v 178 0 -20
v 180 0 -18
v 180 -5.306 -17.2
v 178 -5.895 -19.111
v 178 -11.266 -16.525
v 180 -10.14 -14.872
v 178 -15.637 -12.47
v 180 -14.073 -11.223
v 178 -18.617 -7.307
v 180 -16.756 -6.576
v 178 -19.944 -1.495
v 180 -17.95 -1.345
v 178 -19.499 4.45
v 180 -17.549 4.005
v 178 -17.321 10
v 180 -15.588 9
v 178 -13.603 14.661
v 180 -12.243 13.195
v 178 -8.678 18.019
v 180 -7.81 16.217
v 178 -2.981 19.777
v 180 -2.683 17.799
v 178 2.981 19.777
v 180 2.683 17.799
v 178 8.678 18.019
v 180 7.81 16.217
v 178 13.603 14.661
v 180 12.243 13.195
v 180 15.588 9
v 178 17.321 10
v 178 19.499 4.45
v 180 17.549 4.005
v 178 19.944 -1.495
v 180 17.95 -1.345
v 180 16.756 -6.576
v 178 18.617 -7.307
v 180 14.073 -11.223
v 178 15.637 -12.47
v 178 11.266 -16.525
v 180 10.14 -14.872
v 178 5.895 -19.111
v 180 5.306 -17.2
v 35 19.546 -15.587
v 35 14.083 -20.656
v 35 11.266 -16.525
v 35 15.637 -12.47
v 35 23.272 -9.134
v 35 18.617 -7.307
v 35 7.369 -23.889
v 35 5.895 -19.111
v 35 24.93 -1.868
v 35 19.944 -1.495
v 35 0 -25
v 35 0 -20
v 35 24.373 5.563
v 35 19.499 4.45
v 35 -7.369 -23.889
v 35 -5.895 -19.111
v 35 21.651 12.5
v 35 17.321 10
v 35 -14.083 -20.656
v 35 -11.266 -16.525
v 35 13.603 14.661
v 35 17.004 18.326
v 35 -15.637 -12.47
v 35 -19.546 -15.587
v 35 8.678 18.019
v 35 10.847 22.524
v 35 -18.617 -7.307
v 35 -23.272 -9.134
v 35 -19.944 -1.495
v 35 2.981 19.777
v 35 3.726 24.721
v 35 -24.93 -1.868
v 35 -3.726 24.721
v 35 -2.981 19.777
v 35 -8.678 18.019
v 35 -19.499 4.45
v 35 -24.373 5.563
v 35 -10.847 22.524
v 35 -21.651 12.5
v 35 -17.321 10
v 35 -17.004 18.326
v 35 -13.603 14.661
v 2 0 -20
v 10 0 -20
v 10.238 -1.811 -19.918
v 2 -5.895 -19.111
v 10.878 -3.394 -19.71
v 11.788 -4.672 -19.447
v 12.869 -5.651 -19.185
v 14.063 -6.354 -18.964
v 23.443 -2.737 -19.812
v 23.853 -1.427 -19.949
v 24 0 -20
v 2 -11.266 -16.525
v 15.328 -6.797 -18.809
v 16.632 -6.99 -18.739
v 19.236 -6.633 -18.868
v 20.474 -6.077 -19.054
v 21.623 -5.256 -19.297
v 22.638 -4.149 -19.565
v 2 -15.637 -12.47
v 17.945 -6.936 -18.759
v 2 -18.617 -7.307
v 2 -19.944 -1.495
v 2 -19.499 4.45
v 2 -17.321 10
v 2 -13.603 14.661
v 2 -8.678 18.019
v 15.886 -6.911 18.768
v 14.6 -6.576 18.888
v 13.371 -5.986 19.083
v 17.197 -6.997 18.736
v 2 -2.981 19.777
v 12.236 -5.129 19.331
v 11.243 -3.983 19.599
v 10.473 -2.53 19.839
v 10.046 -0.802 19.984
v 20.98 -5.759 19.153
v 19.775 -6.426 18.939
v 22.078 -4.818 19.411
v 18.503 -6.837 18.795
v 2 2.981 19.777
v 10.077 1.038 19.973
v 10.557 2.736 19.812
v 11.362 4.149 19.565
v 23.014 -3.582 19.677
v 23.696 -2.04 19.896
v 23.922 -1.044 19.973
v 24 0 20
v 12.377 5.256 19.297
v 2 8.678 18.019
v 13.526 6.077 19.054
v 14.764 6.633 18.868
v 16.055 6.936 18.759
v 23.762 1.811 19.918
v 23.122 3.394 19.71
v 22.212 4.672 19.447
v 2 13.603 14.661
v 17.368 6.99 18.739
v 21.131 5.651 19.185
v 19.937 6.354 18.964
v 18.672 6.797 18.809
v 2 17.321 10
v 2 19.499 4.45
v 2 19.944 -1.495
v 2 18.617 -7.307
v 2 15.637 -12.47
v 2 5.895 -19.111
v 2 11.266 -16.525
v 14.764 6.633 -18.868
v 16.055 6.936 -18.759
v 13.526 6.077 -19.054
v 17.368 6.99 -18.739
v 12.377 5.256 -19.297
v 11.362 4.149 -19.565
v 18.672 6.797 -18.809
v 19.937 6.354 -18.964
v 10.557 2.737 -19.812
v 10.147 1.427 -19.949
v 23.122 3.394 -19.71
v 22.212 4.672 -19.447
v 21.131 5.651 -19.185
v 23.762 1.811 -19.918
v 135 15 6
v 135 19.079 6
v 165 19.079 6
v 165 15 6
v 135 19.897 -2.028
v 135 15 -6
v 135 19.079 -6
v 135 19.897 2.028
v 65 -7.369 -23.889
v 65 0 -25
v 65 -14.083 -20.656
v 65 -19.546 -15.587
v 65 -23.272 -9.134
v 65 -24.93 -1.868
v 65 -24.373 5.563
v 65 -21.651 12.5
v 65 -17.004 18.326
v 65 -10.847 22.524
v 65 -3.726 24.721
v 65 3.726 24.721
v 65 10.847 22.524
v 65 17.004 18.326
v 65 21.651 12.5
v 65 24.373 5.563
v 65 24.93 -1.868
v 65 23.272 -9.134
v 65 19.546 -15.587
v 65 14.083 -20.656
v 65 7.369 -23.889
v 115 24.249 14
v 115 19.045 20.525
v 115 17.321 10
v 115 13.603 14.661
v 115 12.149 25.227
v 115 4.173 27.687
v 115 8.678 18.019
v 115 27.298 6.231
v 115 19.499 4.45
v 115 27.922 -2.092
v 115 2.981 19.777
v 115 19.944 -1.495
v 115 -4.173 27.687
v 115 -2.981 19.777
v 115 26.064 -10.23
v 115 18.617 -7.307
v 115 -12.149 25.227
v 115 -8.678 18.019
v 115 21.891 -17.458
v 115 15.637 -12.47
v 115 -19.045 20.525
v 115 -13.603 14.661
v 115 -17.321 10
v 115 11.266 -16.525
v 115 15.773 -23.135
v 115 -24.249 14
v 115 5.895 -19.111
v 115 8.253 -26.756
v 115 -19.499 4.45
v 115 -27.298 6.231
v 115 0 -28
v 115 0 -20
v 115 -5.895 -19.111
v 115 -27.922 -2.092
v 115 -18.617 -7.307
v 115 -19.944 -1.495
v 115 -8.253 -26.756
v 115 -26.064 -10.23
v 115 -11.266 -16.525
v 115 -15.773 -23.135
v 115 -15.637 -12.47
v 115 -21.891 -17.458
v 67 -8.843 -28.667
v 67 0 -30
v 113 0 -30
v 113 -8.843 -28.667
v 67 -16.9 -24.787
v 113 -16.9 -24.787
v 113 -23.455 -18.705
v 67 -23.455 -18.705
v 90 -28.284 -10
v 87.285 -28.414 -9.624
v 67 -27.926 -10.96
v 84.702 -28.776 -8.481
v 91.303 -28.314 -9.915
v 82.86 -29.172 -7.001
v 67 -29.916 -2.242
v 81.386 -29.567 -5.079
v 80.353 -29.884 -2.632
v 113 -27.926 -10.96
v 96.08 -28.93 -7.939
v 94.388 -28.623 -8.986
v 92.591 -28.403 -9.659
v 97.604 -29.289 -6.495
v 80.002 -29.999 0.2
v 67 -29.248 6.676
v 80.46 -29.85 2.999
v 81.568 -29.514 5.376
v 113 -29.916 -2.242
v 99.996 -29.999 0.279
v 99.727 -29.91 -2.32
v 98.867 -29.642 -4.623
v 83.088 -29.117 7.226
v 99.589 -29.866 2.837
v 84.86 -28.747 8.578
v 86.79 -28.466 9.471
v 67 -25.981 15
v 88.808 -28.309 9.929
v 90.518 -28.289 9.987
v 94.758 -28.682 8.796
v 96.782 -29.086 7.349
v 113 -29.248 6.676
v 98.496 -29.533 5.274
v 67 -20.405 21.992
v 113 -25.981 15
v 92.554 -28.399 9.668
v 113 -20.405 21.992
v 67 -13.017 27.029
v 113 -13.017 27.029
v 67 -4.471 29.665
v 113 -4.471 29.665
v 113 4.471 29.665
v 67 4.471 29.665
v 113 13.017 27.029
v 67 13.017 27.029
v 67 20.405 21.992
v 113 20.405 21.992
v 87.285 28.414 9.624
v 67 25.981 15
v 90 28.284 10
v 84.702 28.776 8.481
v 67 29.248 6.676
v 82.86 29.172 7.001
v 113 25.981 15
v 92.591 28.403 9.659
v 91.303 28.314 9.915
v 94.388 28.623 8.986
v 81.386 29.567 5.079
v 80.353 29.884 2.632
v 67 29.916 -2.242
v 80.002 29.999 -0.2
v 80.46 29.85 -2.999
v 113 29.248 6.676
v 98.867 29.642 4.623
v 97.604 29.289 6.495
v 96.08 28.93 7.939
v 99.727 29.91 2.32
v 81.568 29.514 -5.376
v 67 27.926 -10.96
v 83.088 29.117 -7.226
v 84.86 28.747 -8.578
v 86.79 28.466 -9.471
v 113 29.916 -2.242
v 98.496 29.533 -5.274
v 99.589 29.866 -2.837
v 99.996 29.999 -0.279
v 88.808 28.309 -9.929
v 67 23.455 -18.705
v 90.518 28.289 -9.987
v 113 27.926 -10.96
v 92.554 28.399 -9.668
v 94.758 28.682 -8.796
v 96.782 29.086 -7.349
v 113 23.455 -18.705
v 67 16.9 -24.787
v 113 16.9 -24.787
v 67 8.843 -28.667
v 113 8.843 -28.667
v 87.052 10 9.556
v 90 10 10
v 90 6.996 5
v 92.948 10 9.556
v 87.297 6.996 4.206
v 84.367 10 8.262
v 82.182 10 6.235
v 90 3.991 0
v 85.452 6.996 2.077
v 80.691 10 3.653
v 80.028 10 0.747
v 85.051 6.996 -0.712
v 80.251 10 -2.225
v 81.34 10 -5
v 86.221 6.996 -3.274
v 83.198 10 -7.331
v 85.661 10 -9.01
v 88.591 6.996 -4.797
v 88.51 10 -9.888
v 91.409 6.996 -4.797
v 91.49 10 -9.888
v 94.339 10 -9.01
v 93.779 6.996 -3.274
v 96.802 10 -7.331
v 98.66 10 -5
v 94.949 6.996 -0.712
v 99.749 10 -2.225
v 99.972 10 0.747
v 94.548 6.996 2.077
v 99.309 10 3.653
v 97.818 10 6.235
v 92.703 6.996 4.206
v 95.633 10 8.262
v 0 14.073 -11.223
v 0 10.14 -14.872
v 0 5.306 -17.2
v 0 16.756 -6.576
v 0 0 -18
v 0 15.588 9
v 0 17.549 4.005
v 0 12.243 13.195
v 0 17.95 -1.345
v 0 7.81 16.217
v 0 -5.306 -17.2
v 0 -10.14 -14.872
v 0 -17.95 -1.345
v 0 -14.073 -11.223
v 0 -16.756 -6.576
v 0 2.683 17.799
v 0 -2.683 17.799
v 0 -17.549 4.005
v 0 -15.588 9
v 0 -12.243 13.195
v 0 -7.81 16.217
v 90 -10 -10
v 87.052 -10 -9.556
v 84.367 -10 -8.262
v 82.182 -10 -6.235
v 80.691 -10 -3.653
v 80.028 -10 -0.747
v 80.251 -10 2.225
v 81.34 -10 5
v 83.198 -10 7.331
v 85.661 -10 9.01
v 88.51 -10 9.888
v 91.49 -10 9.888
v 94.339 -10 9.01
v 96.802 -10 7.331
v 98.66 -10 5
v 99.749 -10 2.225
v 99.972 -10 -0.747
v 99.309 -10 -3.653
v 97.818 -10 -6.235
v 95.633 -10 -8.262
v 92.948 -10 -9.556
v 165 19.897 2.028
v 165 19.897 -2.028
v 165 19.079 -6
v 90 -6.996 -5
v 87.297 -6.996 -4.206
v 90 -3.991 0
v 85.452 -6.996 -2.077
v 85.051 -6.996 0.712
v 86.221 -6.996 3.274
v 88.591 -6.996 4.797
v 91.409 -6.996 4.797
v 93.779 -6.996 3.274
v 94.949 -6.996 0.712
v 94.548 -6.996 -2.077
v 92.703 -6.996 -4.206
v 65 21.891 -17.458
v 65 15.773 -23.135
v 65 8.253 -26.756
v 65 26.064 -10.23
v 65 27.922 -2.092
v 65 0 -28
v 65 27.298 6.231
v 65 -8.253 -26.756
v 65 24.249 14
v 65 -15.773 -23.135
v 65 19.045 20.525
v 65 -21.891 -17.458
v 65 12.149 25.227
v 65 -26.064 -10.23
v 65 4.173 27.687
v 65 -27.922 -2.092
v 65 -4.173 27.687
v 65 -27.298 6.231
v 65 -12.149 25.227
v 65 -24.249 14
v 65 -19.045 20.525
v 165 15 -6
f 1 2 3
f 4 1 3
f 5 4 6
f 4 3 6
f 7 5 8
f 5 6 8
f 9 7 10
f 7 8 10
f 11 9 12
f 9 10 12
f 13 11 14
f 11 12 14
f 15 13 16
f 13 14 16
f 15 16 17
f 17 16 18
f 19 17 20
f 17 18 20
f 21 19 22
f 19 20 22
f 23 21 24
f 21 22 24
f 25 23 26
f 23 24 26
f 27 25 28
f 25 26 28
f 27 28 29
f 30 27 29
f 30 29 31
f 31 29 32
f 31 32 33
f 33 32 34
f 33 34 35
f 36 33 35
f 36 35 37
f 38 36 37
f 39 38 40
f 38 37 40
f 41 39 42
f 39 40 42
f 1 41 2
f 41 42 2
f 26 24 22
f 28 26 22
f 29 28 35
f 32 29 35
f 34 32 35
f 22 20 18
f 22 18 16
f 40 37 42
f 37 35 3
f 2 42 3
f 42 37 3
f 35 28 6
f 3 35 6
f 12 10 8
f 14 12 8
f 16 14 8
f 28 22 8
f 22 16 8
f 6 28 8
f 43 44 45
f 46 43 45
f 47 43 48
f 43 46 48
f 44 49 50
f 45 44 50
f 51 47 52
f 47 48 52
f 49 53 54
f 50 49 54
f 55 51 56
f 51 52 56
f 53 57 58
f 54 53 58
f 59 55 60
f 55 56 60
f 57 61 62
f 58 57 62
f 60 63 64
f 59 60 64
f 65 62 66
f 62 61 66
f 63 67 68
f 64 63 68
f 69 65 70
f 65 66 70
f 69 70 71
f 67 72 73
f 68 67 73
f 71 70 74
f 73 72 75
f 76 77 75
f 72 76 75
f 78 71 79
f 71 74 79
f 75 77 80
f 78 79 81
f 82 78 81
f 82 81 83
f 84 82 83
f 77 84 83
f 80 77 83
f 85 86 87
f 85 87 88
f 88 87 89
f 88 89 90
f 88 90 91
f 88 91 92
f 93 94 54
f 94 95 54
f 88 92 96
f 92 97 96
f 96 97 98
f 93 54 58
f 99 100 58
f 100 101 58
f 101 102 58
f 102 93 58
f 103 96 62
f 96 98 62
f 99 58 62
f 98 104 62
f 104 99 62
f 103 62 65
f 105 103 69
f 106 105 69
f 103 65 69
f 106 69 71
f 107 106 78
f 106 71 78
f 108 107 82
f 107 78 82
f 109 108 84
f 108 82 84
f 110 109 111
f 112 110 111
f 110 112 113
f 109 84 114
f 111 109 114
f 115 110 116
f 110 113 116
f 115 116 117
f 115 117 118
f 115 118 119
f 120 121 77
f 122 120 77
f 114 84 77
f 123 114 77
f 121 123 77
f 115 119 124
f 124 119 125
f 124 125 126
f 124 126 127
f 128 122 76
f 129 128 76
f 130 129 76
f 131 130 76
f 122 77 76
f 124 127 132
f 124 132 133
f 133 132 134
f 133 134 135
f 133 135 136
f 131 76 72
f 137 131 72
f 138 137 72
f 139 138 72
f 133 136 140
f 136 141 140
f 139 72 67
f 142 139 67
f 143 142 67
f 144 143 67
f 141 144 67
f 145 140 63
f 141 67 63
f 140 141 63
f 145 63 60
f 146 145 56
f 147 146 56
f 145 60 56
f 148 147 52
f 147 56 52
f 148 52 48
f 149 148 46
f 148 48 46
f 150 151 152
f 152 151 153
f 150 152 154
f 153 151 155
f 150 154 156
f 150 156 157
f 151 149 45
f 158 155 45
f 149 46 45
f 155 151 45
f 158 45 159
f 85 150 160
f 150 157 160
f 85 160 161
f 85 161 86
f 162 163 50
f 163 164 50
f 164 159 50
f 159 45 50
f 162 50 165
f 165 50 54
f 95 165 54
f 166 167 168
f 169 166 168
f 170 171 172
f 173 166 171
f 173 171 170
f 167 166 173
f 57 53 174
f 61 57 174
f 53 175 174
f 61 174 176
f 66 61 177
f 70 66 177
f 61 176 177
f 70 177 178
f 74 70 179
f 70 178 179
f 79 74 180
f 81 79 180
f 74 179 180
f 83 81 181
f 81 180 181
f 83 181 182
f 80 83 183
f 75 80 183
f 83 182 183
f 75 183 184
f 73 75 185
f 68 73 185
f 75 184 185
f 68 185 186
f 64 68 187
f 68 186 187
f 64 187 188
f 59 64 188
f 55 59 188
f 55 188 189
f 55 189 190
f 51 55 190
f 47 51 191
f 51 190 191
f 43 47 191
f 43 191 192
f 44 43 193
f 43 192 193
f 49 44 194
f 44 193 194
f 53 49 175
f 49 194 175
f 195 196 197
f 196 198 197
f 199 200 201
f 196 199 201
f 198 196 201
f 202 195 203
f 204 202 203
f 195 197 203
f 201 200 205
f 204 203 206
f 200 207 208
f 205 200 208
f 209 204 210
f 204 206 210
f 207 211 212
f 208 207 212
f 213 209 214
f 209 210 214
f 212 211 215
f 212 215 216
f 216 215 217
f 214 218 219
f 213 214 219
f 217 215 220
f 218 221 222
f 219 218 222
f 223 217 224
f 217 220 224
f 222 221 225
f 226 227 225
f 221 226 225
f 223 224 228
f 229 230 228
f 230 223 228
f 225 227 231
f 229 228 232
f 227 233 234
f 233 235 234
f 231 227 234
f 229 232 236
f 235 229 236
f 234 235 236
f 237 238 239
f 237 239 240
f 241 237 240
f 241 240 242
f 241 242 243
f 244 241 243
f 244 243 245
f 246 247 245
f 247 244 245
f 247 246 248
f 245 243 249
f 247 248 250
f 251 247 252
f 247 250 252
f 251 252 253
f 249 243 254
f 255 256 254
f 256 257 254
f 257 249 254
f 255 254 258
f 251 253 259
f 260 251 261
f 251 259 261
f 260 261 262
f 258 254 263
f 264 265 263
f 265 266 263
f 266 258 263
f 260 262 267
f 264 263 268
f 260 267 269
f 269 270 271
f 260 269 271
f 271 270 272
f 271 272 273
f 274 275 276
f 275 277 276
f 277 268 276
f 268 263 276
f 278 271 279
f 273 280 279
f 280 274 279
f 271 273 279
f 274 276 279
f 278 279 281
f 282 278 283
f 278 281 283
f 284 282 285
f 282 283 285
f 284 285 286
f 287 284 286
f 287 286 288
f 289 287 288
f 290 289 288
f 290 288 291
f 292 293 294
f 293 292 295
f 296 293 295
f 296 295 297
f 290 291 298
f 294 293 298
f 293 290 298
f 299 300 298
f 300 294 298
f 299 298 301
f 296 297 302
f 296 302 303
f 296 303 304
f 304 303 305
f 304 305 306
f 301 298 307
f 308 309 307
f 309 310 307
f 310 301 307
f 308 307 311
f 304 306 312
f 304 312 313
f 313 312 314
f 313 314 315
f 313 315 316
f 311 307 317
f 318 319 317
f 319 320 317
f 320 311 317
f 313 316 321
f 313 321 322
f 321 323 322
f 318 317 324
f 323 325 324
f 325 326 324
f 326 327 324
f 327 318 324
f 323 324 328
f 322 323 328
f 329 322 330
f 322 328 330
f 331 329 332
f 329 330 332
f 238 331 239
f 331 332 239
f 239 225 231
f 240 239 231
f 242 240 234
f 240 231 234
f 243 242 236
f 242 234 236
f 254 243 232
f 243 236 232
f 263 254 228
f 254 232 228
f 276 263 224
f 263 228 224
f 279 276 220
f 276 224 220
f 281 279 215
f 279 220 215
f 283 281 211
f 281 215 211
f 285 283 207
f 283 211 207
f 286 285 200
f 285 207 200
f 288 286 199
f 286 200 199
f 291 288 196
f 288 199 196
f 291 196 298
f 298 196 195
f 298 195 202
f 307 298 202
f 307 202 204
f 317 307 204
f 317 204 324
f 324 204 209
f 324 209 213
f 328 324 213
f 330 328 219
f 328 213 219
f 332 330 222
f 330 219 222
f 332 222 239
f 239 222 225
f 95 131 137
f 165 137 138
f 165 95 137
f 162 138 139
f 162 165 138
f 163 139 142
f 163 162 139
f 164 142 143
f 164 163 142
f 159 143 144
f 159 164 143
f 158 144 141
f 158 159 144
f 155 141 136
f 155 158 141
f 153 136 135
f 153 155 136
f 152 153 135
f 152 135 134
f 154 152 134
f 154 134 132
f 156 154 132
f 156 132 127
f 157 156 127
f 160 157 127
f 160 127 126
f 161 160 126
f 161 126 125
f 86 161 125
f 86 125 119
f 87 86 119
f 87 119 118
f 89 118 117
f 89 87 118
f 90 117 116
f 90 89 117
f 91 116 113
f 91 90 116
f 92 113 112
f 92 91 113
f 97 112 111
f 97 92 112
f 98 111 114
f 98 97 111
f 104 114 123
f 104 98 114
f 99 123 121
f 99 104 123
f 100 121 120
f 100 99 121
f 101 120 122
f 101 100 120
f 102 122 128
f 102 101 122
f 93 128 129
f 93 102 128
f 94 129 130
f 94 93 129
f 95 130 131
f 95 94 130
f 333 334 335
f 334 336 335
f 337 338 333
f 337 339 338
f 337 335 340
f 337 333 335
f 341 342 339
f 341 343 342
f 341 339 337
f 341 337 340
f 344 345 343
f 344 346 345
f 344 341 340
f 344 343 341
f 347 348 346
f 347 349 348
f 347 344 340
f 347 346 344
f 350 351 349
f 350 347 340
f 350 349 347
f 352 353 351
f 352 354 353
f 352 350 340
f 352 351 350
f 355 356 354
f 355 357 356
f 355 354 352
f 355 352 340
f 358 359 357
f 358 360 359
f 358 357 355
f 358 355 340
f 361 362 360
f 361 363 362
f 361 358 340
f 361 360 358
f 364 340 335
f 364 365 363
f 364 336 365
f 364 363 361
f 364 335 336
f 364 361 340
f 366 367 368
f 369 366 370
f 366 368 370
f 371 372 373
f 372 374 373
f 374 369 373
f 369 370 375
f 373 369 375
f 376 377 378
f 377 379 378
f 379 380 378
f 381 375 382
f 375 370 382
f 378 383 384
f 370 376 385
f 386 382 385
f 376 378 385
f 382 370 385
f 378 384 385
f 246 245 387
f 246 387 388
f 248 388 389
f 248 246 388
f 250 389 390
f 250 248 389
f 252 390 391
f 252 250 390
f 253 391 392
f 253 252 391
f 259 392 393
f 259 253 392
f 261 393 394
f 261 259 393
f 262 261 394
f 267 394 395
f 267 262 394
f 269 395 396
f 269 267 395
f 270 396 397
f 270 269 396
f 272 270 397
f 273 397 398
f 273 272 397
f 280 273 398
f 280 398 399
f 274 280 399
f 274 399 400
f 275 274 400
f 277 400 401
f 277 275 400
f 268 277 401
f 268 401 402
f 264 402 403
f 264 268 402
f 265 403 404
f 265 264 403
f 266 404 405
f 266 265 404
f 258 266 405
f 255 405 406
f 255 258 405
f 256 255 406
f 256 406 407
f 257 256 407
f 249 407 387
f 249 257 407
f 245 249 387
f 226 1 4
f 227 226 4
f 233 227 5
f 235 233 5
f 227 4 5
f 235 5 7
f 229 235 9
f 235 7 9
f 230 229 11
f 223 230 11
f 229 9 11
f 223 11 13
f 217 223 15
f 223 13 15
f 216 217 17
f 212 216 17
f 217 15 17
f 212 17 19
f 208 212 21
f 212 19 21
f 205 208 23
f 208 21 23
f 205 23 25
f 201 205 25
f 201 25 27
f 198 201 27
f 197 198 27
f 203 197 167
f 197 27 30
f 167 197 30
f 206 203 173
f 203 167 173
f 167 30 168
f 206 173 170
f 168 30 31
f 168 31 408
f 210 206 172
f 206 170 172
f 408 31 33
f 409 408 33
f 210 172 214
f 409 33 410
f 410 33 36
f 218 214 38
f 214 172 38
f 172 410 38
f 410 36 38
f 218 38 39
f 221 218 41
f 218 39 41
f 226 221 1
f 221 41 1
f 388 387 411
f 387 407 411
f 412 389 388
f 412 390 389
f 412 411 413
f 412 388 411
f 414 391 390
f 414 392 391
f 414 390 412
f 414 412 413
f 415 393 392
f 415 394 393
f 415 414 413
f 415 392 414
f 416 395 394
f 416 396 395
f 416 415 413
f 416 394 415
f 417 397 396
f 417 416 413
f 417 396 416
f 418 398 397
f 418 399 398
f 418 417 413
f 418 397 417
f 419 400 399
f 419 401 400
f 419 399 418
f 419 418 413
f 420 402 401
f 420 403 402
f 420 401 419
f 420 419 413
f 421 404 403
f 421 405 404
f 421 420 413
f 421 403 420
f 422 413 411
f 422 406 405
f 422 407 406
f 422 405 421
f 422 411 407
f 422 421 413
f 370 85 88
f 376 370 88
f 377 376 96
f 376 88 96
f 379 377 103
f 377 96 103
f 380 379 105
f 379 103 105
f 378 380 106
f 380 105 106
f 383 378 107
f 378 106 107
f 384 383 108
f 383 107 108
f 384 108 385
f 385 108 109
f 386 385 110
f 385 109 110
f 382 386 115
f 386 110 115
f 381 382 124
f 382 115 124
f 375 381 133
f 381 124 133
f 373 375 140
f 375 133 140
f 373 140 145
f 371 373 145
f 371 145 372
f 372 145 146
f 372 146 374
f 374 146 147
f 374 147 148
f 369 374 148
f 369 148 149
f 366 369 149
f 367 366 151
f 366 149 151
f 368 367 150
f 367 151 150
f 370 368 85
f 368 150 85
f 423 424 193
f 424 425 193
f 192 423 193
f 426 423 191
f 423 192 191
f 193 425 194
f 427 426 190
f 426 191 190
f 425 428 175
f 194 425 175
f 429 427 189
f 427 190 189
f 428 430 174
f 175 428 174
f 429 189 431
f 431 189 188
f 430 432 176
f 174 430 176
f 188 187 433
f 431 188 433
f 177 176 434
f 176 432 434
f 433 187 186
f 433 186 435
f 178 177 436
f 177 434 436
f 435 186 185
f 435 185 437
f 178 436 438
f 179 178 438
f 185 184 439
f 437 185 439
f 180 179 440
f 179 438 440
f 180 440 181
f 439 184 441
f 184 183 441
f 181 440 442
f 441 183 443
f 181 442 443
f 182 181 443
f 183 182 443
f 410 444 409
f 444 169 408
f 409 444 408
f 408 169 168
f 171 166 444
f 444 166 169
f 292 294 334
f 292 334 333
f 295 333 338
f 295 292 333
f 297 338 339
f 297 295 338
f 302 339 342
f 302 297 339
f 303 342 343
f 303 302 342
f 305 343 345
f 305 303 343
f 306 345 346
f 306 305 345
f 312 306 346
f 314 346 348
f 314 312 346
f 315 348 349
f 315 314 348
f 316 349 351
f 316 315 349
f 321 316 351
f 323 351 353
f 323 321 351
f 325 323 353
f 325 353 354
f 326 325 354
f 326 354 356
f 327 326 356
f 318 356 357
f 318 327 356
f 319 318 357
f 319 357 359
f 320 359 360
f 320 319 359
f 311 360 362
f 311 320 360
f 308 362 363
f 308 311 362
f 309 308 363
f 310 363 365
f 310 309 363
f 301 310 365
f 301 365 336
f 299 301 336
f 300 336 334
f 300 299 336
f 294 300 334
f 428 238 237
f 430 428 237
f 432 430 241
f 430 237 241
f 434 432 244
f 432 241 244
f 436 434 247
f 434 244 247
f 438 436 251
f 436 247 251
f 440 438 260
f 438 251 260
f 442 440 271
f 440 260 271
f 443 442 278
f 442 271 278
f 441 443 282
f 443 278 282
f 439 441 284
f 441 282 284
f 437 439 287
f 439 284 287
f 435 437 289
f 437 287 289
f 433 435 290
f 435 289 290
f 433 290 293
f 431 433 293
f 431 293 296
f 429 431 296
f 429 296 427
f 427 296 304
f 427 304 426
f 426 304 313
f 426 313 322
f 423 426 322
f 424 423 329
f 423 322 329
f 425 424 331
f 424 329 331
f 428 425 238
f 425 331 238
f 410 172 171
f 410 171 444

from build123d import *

# Parameters (mm, degrees)
SKETCH_2_W               = 30
SKETCH_2_H               = 5
CUT_EXTRUDE_1_DEPTH      = 6
CUT_EXTRUDE_2_DEPTH      = 185.932420089
CUT_EXTRUDE_2_DEPTH_BACK = 185.932420089
SKETCH_3_R               = 7
PATTERN_CIRCULAR_1_COUNT = 2
CHAMFER_1_SIZE           = 2


with BuildPart() as part:
    # Эскиз1 → Повернуть1 (revolve)
    with BuildSketch(Plane.XY, mode=Mode.PRIVATE) as revolve_1_sk:
        Polygon((0, 0), (0, 20), (35, 20), (35, 25), (65, 25), (65, 30), (115, 30), (115, 20), (180, 20), (180, 0), align=None)
    revolve(revolve_1_sk.sketch.rotate(Axis((0, 0, 0), (-1, 0, 0)), 90), axis=Axis((0, 0, 0), (-1, 0, 0)))

    # Эскиз2 → Вырез-Вытянуть1 (cut, symmetric)
    with BuildSketch(Plane.XY):
        with Locations((150, 17.5)):
            Rectangle(SKETCH_2_W, SKETCH_2_H)
    extrude(amount=CUT_EXTRUDE_1_DEPTH, both=True, mode=Mode.SUBTRACT)

    # Эскиз3 → Вырез-Вытянуть2 (cut, two sides: drawn at the far end of the back side and taken through both)
    with BuildSketch(Plane.XY.offset(-CUT_EXTRUDE_2_DEPTH_BACK)):
        with Locations((17, 0)):
            Circle(SKETCH_3_R)
    extrude(amount=CUT_EXTRUDE_2_DEPTH + CUT_EXTRUDE_2_DEPTH_BACK, mode=Mode.SUBTRACT)

    # Эскиз4 → Диаметр отверстия Ø16.0 (20)1 (revolve, cut)
    with BuildSketch(Plane(origin=(90, 30, 0), x_dir=(0, 0, 1), z_dir=(1, 0, 0))):
        Polygon((0, 0), (0, 26.00860619), (10, 20), (10, 0), align=None)
    hole_wizard_16_0_20_1 = revolve(axis=Axis((90, 36.35, 0), (0, -1, 0)), mode=Mode.SUBTRACT)

    # Круговой массив1: Диаметр отверстия Ø16.0 (20)1 ×2 about axis
    pattern_circular_1_axis = Axis((0, 0, 0), (1, 0, 0))
    for i in range(1, PATTERN_CIRCULAR_1_COUNT):
        add(hole_wizard_16_0_20_1.rotate(pattern_circular_1_axis, i * 360 / PATTERN_CIRCULAR_1_COUNT), mode=Mode.SUBTRACT)

    # Фаска1
    chamfer_1_edges = [part.edges().sort_by_distance(p)[0] for p in [
        (0, 0, 20),
        (180, 0, 20),
        (115, 0, 30),
        (65, 0, 30),
    ]]
    chamfer(chamfer_1_edges, length=CHAMFER_1_SIZE)


solid = part.part
